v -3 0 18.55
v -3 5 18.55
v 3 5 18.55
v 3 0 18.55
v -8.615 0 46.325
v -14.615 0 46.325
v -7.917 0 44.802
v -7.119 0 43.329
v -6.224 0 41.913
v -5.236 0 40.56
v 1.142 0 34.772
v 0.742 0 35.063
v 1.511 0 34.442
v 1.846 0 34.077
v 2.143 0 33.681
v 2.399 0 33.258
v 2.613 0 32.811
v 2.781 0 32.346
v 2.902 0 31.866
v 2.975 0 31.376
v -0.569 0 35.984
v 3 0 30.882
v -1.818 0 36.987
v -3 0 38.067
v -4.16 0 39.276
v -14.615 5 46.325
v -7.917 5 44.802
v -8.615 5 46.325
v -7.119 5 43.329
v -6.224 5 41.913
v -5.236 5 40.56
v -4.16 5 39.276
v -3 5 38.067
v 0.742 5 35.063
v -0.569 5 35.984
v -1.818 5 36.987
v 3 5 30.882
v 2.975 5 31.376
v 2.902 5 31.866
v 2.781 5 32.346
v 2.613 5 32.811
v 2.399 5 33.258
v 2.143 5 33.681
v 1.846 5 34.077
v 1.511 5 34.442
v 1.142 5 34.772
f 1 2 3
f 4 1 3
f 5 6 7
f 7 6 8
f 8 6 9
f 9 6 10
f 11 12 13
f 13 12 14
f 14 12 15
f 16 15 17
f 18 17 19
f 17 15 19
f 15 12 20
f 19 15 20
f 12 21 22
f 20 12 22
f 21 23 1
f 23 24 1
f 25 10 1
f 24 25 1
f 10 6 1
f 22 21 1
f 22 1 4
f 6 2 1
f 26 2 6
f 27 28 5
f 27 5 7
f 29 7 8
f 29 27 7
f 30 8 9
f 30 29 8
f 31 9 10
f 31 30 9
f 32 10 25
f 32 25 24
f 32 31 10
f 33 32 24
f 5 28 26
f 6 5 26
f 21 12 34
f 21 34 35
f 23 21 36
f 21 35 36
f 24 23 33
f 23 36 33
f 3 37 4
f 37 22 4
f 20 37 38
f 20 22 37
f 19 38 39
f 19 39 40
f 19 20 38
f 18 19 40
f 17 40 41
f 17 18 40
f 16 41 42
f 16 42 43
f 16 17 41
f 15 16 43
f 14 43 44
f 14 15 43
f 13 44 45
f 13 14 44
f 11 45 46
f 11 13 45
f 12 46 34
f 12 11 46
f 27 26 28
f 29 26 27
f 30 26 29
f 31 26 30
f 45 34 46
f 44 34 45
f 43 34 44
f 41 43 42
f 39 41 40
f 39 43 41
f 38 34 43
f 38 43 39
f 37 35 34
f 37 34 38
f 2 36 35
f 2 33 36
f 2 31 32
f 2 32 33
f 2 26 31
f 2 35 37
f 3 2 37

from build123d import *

# Parameters (mm, degrees)
EXTRUDE_2_DEPTH     = 5
SKETCH_4_R          = 1.65
CUT_EXTRUDE_1_DEPTH = 5
EXTRUDE_3_DEPTH     = 5
CUT_EXTRUDE_START   = -4.5
SKETCH_7_R          = 3
CUT_EXTRUDE_2_DEPTH = 3
CUT_EXTRUDE_3_DEPTH = 7.5
EXTRUDE_4_DEPTH     = 5
FILLET_1_R          = 5
FILLET_2_R          = 5
SKETCH_10_R         = 1.65
CUT_EXTRUDE_4_DEPTH = 5


with BuildPart() as part:
    # 草图3 → 凸台-拉伸2 (new body)
    with BuildSketch(Plane(origin=(0, 0, 0), x_dir=(1, 0, 0), z_dir=(0, 1, 0))):
        with BuildLine():
            Line((-3, -3.354101966), (-3, -7.416198487))
            Line((-3, -7.416198487), (-3, -43.854101966))
            Line((-3, -43.854101966), (3, -43.854101966))
            Line((3, -43.854101966), (3, -10.583005244))
            Line((3, -10.583005244), (3, -7.416198487))
            Line((3, -7.416198487), (3, -3.354101966))
            ThreePointArc((3, -3.354101966), (0, 4.5), (-3, -3.354101966))
        make_face()
    extrude(amount=EXTRUDE_2_DEPTH)

    # 草图4 → 切除-拉伸1 (cut)
    with BuildSketch(Plane(origin=(0, 5, 0), x_dir=(1, 0, 0), z_dir=(0, 1, 0))):
        with Locations(Location((0, 0, 0), (0, 0, 270))):
            Circle(SKETCH_4_R)
    extrude(amount=-CUT_EXTRUDE_1_DEPTH, mode=Mode.SUBTRACT)

    # 草图6 → 凸台-拉伸3 (add)
    with BuildSketch(Plane(origin=(0, 5, 0), x_dir=(1, 0, 0), z_dir=(0, 1, 0))):
        with BuildLine():
            Line((3, -33.74604712), (-3, -33.74604712))
            ThreePointArc((-3, -33.74604712), (-16.46902092, -57.986607816), (0.722500961, -79.745993902))
            Line((0.722500961, -79.745993902), (1.949520222, -77.620734201))
            ThreePointArc((1.949520222, -77.620734201), (-10.543317179, -55.371702353), (3, -33.74604712))
        make_face()
    extrude(amount=-EXTRUDE_3_DEPTH)

    # 草图7 → 切除-拉伸2 (cut)
    with BuildSketch(Plane(origin=(0, 5, 0), x_dir=(1, 0, 0), z_dir=(0, 1, 0)).offset(CUT_EXTRUDE_START)):
        with Locations(Location((0, 0, 0), (0, 0, 270))):
            Circle(SKETCH_7_R)
    extrude(amount=-CUT_EXTRUDE_2_DEPTH, mode=Mode.SUBTRACT)

    # 草图8 → 切除-拉伸3 (cut)
    with BuildSketch(Plane(origin=(0, 5, 0), x_dir=(1, 0, 0), z_dir=(0, 1, 0))):
        with BuildLine():
            Line((-3, -38.067187498), (-3, -43.854101966))
            Line((-3, -43.854101966), (3, -43.854101966))
            Line((3, -43.854101966), (3, -33.74604712))
            ThreePointArc((3, -33.74604712), (-0.160637142, -35.683569047), (-3, -38.067187498))
        make_face()
    extrude(amount=-CUT_EXTRUDE_3_DEPTH, mode=Mode.SUBTRACT)

    # 草图9 → 凸台-拉伸4 (add)
    with BuildSketch(Plane(origin=(0, 5, 0), x_dir=(1, 0, 0), z_dir=(0, 1, 0))):
        with BuildLine():
            Line((-3, -18.550074543), (-14.614967684, -46.324924269))
            ThreePointArc((-14.614967684, -46.324924269), (-9.917875534, -39.010182445), (-3, -33.74604712))
            Line((-3, -33.74604712), (-3, -18.550074543))
        make_face()
    extrude(amount=-EXTRUDE_4_DEPTH)

    # 圆角1
    fillet_1_edges = [part.edges().sort_by_distance(p)[0] for p in [
        (3, 2.5, 33.74604712),
    ]]
    fillet(fillet_1_edges, radius=FILLET_1_R)

    # 圆角2
    # the kernel refuses this fillet: 5 mm, written as the material it takes off along each edge
    with BuildSketch(Plane(origin=(1.949520222, 14.371610933, 77.620734201), x_dir=(-0.8261015944022844, 0, -0.5635212114250925), z_dir=(0, -1, 0))) as fillet_2_piece_1:
        with BuildLine():
            CenterArc((4.123508811, -4.985927863), FILLET_2_R, 94.299664485, 55.185648669)
            Line((-0.183986354, -2.447131808), (-0.270136257, -2.396355887))
            ThreePointArc((-0.270136257, -2.396355887), (-0.191711734, -1.216068615), (-0.099718557, 0.007497289))
            Line((-0.099718557, 0.007497289), (0.007497289, 0.099718557))
            ThreePointArc((0.007497289, 0.099718557), (1.874322187, 0.029639314), (3.741147084, 0.099718557))
            Line((3.741147084, 0.099718557), (3.748644373, 0))
        make_face()
    extrude(amount=23.743221866, mode=Mode.SUBTRACT)

    # 草图10 → 切除-拉伸4 (cut)
    # profile 1 of 2: a face of its own
    with BuildSketch(Plane(origin=(0, 5, 0), x_dir=(1, 0, 0), z_dir=(0, 1, 0))):
        with BuildLine():
            Line((-3, -3.354101966), (-3, -18.550074543))
            Line((-3, -18.550074543), (3, -18.550074543))
            Line((3, -18.550074543), (3, -3.354101966))
            ThreePointArc((3, -3.354101966), (0, 4.5), (-3, -3.354101966))
        make_face()
        Circle(SKETCH_10_R, mode=Mode.SUBTRACT)
    # profile 2 of 2: a face of its own
    with BuildSketch(Plane(origin=(0, 5, 0), x_dir=(1, 0, 0), z_dir=(0, 1, 0))):
        with BuildLine():
            Line((-8.614967684, -46.324924269), (-14.614967684, -46.324924269))
            ThreePointArc((-14.614967684, -46.324924269), (-14.272081884, -66.397409294), (0.722500961, -79.745993902))
            ThreePointArc((0.722500961, -79.745993902), (0.307928877, -77.397579493), (-1.147240872, -75.508293582))
            ThreePointArc((-1.147240872, -75.508293582), (-9.770106213, -62.167654699), (-8.614967684, -46.324924269))
        make_face()
    extrude(amount=-CUT_EXTRUDE_4_DEPTH, mode=Mode.SUBTRACT)


solid = part.part
